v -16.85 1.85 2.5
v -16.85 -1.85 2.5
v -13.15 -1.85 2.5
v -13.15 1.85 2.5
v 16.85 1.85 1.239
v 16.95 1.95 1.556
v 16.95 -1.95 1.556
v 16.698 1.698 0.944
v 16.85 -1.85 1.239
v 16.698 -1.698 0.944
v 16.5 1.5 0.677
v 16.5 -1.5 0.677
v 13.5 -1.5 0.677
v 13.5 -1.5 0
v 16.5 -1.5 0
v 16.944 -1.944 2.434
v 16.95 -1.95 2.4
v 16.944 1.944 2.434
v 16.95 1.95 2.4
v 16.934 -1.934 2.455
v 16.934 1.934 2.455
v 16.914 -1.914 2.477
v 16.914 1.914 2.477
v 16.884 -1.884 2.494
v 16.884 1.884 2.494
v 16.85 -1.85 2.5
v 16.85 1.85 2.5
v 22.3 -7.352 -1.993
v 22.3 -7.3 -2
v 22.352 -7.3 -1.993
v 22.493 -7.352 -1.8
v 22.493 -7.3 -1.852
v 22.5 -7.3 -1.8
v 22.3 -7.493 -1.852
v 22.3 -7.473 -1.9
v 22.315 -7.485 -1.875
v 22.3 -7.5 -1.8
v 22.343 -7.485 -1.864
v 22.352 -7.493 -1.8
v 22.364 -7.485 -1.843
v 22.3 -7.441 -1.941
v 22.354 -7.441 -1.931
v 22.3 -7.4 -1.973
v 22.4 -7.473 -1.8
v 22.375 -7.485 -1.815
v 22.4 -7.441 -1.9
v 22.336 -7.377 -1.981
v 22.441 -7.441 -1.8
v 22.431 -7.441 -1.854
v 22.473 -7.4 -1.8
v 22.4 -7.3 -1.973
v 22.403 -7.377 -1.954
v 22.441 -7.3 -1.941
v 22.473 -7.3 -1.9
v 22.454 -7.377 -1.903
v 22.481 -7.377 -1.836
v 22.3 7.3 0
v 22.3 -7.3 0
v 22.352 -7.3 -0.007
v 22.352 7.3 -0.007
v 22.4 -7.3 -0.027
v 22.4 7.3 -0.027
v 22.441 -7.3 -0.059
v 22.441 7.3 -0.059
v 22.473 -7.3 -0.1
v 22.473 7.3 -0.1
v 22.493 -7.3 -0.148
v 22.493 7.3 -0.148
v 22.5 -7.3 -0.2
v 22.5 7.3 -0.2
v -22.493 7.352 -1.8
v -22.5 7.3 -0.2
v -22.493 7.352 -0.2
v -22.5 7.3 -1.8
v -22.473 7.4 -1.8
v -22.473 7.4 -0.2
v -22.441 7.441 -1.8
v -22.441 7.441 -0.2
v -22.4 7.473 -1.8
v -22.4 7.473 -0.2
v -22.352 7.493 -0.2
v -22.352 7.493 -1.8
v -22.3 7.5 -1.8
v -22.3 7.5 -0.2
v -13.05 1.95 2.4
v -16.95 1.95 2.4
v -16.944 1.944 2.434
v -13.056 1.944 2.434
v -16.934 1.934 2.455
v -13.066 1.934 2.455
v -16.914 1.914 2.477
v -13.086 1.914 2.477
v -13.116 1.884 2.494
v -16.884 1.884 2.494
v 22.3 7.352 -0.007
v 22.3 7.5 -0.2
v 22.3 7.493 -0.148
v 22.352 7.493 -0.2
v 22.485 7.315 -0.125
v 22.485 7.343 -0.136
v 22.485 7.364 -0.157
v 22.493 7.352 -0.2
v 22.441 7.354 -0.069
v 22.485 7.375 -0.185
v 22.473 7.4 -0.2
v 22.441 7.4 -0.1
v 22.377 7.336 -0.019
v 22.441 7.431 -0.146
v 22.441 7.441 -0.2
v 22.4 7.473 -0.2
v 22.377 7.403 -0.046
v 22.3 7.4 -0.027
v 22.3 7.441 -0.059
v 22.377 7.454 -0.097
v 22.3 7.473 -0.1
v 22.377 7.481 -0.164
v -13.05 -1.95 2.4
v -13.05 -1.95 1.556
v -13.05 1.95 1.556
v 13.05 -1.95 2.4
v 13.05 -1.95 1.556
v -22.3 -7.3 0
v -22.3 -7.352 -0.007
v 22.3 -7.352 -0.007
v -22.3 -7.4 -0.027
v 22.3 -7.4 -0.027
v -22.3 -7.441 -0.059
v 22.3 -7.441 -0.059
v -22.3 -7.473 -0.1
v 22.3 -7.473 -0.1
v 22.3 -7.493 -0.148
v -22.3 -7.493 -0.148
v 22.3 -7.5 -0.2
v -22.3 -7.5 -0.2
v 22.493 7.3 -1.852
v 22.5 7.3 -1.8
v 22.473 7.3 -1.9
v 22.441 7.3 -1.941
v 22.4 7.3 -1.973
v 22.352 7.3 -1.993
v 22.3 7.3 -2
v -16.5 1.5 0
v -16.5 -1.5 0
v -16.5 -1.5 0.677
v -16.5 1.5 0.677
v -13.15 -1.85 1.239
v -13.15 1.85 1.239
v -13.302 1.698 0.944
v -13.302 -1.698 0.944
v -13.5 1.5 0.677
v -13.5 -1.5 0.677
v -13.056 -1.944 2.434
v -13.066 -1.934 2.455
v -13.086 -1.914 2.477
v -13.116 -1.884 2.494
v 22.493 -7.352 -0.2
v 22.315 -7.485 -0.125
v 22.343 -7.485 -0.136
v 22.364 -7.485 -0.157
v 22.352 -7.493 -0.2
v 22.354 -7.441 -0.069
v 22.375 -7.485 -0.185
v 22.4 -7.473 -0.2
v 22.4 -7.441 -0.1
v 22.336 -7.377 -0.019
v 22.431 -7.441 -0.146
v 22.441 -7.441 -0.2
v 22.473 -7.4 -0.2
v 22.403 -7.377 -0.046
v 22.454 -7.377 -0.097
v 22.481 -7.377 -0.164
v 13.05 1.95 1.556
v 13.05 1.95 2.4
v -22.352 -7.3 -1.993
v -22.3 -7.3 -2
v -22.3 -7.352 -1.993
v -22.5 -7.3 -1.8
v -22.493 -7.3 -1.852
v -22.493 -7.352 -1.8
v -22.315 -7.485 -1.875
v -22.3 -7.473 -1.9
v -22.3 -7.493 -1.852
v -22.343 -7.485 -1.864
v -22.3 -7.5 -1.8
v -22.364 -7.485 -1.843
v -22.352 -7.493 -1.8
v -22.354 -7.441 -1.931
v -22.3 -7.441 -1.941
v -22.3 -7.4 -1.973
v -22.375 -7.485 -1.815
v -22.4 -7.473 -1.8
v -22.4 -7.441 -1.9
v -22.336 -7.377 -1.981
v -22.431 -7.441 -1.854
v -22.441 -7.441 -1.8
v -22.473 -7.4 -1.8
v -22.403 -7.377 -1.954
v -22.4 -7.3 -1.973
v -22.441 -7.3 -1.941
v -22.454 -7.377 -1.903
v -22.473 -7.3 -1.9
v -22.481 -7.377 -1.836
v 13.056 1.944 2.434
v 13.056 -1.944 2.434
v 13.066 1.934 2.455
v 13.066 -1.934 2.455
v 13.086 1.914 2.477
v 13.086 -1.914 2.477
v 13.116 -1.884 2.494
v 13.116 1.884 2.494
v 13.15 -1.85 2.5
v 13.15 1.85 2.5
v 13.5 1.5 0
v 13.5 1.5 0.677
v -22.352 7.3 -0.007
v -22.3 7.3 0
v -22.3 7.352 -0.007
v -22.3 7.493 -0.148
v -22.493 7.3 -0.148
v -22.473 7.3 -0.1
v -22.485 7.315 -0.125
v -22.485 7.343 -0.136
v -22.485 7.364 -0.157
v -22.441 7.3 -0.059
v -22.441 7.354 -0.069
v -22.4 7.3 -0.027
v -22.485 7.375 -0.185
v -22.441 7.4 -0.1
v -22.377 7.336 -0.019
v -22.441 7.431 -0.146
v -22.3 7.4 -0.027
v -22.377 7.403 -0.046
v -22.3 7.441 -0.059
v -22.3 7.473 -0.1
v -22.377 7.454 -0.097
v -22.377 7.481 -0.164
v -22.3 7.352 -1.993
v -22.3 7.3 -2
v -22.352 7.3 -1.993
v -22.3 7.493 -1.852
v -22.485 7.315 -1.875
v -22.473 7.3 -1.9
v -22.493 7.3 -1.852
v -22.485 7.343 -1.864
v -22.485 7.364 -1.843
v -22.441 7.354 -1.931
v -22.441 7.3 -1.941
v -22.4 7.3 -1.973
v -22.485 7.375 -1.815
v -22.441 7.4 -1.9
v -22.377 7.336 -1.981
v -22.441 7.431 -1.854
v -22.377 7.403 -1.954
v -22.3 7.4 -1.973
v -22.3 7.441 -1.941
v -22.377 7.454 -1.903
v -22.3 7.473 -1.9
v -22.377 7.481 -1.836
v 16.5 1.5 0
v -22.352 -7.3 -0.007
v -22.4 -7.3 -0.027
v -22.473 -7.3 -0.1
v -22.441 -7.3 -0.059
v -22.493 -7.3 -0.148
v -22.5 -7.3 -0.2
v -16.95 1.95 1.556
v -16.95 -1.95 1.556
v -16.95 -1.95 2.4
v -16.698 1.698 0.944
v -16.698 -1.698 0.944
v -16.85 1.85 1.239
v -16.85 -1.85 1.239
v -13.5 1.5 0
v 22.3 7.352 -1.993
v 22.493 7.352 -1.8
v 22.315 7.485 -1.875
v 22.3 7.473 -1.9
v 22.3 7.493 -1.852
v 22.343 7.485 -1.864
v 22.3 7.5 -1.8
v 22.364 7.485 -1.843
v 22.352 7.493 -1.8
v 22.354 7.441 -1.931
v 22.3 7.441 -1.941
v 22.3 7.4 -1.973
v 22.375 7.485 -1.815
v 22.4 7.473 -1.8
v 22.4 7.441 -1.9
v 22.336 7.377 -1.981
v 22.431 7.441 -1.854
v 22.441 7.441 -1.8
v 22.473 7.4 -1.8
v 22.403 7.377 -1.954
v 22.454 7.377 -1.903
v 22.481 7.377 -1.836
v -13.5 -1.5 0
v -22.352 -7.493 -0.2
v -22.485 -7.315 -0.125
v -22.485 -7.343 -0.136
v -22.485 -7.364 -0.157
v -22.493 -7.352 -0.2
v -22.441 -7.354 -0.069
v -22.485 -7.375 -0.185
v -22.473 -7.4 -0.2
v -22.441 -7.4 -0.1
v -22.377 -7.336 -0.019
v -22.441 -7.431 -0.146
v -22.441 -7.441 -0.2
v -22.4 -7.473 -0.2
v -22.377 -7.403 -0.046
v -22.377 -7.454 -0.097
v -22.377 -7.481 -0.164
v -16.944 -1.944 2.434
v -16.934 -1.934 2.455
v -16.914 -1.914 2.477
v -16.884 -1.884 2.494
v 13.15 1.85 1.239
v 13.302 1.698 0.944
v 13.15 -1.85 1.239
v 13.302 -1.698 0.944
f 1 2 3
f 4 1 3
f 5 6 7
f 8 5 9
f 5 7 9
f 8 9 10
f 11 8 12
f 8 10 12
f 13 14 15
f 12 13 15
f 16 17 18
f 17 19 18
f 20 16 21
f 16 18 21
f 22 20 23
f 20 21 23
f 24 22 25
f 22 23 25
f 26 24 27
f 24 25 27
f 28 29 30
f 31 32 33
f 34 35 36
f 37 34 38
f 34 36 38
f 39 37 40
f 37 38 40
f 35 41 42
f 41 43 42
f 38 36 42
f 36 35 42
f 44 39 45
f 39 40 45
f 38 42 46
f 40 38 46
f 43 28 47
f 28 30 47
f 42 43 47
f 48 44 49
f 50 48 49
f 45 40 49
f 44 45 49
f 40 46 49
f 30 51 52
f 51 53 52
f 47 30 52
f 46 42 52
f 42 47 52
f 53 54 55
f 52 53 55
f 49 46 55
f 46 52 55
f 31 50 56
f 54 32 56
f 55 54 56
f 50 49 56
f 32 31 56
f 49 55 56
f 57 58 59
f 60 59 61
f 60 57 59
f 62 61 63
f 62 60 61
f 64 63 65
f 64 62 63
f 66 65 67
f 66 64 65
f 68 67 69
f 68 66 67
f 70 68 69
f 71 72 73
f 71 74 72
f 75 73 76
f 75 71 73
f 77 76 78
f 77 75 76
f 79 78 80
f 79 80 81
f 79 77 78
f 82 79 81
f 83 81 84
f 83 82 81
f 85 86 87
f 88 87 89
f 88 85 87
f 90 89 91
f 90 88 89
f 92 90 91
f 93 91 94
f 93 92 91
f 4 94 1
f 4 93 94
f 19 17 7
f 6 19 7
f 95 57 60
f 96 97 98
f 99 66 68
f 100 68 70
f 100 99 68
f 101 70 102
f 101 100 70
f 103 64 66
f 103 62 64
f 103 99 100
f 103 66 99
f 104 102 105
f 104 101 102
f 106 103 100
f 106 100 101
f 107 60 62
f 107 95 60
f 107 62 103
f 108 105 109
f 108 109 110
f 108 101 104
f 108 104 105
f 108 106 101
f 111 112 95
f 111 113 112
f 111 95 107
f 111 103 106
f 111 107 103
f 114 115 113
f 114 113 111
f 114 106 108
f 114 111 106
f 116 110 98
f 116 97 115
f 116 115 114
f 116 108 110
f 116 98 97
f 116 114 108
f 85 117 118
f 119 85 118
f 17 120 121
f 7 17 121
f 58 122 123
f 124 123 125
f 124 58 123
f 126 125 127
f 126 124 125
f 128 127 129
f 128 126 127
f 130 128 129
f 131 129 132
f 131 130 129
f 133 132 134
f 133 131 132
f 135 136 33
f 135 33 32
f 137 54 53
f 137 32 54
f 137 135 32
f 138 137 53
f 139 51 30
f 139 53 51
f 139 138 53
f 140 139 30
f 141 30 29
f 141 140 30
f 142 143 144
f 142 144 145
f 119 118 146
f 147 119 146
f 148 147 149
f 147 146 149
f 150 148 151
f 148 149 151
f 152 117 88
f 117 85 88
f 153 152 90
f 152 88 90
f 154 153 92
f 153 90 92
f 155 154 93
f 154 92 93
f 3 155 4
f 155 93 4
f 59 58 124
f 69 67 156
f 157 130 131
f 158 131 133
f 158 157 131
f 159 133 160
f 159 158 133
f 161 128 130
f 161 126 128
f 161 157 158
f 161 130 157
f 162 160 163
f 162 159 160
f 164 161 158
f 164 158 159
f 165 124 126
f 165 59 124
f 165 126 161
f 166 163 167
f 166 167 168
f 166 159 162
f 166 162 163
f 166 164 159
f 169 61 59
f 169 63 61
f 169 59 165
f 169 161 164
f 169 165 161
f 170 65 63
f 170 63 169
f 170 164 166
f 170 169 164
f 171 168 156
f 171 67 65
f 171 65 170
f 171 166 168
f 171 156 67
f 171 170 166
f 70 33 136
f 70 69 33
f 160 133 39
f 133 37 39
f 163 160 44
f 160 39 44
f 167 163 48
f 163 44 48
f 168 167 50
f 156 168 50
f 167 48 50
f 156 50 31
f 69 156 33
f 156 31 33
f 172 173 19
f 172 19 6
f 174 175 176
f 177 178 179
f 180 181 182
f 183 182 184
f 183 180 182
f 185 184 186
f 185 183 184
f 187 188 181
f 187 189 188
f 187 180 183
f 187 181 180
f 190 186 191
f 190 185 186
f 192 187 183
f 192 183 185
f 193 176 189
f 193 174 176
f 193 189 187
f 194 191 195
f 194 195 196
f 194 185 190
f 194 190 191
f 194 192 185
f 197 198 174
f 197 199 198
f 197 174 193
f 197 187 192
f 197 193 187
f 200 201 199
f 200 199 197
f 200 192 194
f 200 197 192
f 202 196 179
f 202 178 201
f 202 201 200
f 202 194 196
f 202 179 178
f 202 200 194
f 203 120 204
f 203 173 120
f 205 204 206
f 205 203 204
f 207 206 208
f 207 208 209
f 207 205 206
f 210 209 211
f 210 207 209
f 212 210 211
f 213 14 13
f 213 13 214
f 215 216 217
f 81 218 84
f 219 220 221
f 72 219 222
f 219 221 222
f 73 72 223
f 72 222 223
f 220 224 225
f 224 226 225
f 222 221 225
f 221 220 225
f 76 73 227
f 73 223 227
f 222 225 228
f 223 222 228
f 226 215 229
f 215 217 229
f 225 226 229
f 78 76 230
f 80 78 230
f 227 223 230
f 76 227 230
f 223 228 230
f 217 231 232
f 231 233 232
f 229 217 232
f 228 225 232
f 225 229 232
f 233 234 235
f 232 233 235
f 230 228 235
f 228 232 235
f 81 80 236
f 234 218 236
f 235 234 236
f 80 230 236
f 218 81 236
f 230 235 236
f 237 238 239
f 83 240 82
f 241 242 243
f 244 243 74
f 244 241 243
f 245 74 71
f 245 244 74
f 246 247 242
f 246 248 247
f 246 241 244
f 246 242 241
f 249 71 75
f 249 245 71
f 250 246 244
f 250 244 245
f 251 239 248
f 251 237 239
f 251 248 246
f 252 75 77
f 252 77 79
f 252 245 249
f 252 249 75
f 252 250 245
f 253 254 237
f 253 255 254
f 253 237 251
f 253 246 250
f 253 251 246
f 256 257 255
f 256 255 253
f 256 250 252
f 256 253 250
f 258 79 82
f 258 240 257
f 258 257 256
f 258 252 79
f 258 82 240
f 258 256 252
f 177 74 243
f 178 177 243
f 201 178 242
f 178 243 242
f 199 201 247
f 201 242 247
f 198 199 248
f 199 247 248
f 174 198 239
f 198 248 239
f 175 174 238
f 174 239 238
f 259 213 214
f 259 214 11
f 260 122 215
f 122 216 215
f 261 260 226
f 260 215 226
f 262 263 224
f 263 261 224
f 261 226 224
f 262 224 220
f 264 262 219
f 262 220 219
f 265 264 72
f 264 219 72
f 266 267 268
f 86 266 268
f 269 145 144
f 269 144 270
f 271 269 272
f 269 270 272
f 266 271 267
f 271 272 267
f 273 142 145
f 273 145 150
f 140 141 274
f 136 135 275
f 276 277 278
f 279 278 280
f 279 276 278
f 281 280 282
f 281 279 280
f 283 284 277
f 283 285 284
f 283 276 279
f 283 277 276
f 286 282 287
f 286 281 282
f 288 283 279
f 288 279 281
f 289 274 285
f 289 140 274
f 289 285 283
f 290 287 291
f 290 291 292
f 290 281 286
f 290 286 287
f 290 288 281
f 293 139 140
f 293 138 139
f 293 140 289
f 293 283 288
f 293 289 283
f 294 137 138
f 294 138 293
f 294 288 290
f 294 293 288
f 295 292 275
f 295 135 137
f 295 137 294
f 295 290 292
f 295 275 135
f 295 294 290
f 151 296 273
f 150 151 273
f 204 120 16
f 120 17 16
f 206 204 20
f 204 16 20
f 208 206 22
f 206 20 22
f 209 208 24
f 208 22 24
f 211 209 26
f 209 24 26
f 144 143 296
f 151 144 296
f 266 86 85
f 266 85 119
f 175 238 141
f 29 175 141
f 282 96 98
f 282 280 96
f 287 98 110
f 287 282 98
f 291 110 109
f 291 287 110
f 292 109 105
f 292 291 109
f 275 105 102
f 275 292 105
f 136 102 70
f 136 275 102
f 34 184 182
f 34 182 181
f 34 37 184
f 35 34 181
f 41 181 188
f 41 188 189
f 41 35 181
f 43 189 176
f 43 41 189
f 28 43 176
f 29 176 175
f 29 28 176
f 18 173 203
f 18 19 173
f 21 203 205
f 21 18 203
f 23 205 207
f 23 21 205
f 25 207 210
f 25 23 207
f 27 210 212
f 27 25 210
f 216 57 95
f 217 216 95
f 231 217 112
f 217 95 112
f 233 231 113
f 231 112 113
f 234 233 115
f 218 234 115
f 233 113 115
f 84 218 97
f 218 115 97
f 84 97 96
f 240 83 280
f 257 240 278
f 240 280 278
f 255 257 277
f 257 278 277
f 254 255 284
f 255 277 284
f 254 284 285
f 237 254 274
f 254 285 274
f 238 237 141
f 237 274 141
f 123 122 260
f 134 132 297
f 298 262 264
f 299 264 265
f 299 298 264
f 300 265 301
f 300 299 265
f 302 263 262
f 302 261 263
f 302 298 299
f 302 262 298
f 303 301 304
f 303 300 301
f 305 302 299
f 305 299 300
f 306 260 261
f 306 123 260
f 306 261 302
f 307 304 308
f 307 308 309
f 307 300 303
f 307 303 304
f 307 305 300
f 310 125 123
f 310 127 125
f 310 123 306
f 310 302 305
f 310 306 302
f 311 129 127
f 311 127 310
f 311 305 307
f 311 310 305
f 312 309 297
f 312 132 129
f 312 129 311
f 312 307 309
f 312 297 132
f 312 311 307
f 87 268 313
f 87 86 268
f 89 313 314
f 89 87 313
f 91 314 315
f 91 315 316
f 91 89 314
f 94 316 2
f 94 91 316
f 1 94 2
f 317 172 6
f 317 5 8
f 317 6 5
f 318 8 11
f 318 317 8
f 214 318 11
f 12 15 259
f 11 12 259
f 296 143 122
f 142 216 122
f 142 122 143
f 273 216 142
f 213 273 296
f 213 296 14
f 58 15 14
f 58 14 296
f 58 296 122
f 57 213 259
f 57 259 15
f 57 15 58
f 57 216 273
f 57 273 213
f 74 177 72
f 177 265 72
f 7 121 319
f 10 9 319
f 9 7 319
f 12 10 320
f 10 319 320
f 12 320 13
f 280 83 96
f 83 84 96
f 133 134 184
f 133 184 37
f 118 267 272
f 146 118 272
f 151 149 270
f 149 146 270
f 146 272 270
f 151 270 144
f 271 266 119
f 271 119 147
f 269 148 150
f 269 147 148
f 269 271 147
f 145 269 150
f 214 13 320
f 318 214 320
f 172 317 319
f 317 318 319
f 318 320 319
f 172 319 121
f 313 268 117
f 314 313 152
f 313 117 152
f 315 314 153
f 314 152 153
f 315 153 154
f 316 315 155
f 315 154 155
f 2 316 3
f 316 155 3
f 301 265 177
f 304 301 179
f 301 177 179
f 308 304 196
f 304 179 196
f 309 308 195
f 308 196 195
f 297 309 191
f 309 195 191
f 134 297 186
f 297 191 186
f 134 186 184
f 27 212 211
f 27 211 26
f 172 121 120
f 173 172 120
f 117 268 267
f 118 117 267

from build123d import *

# Parameters (mm, degrees)
SKETCH_1_W           = 45
SKETCH_1_H           = 15
EXTRUDE_1_DEPTH      = 2
SKETCH_2_W           = 3
SKETCH_2_H           = 3
EXTRUDE_2_DEPTH      = 1
EXTRUDE_3_DEPTH      = 2
EXTRUDE_3_DEPTH_BACK = 2
CUT_EXTRUDE_1_DEPTH  = 41.234344782
FILLET_1_R           = 0.2
FILLET_2_R           = 0.1


with BuildPart() as part:
    # 草图1 → 凸台-拉伸1 (new body)
    with BuildSketch(Plane.XY):
        Rectangle(SKETCH_1_W, SKETCH_1_H)
    extrude(amount=-EXTRUDE_1_DEPTH)

    # 草图2 → 凸台-拉伸2 (add)
    with BuildSketch(Plane.XY):
        with Locations((-15, 0)):
            Rectangle(SKETCH_2_W, SKETCH_2_H)
        with Locations((15, 0)):
            Rectangle(SKETCH_2_W, SKETCH_2_H)
    extrude(amount=EXTRUDE_2_DEPTH)

    # 草图3 → 凸台-拉伸3 (add, two sides: drawn at the far end of the back side and taken through both)
    with BuildSketch(Plane(origin=(0, 0, 0), x_dir=(1, 0, 0), z_dir=(0, 1, 0)).offset(-EXTRUDE_3_DEPTH_BACK)):
        with BuildLine():
            Line((-16.95, -2.5), (-13.05, -2.5))
            Line((-13.05, -2.5), (-13.05, -1.555590279))
            ThreePointArc((-13.05, -1.555590279), (-13.219957697, -1.088161527), (-13.5, -0.677124344))
            Line((-13.5, -0.677124344), (-16.5, -0.677124344))
            ThreePointArc((-16.5, -0.677124344), (-16.780042303, -1.088161527), (-16.95, -1.555590279))
            Line((-16.95, -1.555590279), (-16.95, -2.5))
        make_face()
        with BuildLine():
            Line((16.5, -0.677124344), (13.5, -0.677124344))
            ThreePointArc((13.5, -0.677124344), (13.219957697, -1.088161527), (13.05, -1.555590279))
            Line((13.05, -1.555590279), (13.05, -2.5))
            Line((13.05, -2.5), (16.95, -2.5))
            Line((16.95, -2.5), (16.95, -1.555590279))
            ThreePointArc((16.95, -1.555590279), (16.780042303, -1.088161527), (16.5, -0.677124344))
        make_face()
    extrude(amount=EXTRUDE_3_DEPTH + EXTRUDE_3_DEPTH_BACK)

    # 草图4 → 切除-拉伸1 (cut, through all)
    with BuildSketch(Plane.ZY.offset(16.95)):
        with BuildLine():
            Line((2.5, 1.95), (1.555590279, 1.95))
            ThreePointArc((1.555590279, 1.95), (1.088161527, 1.780042303), (0.677124344, 1.5))
            Line((0.677124344, 1.5), (0.677124344, 2))
            Line((0.677124344, 2), (2.5, 2))
            Line((2.5, 2), (2.5, 1.95))
        make_face()
        with BuildLine():
            Line((0.677124344, -2), (2.5, -2))
            Line((2.5, -2), (2.5, -1.95))
            Line((2.5, -1.95), (1.555590279, -1.95))
            ThreePointArc((1.555590279, -1.95), (1.088161527, -1.780042303), (0.677124344, -1.5))
            Line((0.677124344, -1.5), (0.677124344, -2))
        make_face()
    extrude(amount=-CUT_EXTRUDE_1_DEPTH, mode=Mode.SUBTRACT)

    # 圆角1
    fillet_1_edges = [part.edges().sort_by_distance(p)[0] for p in [
        (22.5, 0, -2),
        (0, 7.5, -2),
        (-22.5, 0, -2),
        (0, 7.5, 0),
        (22.5, 0, 0),
        (0, -7.5, 0),
        (-22.5, 0, 0),
        (0, -7.5, -2),
        (-22.5, 7.5, -1),
        (22.5, 7.5, -1),
        (22.5, -7.5, -1),
        (-22.5, -7.5, -1),
    ]]
    fillet(fillet_1_edges, radius=FILLET_1_R)

    # 圆角2
    fillet_2_edges = [part.edges().sort_by_distance(p)[0] for p in [
        (13.05, 0, 2.5),
        (16.95, 0, 2.5),
        (-16.95, 0, 2.5),
        (-13.05, 0, 2.5),
        (-15, -1.95, 2.5),
        (15, -1.95, 2.5),
        (-15, 1.95, 2.5),
        (15, 1.95, 2.5),
    ]]
    fillet(fillet_2_edges, radius=FILLET_2_R)


solid = part.part
